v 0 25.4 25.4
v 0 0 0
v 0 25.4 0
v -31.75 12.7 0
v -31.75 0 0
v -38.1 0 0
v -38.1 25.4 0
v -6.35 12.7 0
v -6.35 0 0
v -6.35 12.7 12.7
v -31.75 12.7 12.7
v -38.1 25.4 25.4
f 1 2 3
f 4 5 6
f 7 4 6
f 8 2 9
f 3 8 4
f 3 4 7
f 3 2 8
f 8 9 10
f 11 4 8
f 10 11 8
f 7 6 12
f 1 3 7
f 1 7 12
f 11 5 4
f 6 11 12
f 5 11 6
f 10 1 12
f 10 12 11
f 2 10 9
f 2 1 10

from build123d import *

# Parameters (mm, degrees)
F1_DEPTH = 38.1
F2_W     = 25.4
F2_H     = 12.7
F3_DEPTH = 25.401


with BuildPart() as f1:
    # F0 (on Right) → F1 (new body)
    with BuildSketch(Plane.YZ):
        Polygon((25.4, 25.4), (0, 0), (25.4, 0), align=None)
    extrude(amount=-F1_DEPTH)

    # F2 (on Top) → F3 (cut, through all)
    with BuildSketch(Plane.XY):
        with Locations((-19.05, 6.35)):
            Rectangle(F2_W, F2_H)
    extrude(amount=F3_DEPTH, mode=Mode.SUBTRACT)


solid = f1.part
